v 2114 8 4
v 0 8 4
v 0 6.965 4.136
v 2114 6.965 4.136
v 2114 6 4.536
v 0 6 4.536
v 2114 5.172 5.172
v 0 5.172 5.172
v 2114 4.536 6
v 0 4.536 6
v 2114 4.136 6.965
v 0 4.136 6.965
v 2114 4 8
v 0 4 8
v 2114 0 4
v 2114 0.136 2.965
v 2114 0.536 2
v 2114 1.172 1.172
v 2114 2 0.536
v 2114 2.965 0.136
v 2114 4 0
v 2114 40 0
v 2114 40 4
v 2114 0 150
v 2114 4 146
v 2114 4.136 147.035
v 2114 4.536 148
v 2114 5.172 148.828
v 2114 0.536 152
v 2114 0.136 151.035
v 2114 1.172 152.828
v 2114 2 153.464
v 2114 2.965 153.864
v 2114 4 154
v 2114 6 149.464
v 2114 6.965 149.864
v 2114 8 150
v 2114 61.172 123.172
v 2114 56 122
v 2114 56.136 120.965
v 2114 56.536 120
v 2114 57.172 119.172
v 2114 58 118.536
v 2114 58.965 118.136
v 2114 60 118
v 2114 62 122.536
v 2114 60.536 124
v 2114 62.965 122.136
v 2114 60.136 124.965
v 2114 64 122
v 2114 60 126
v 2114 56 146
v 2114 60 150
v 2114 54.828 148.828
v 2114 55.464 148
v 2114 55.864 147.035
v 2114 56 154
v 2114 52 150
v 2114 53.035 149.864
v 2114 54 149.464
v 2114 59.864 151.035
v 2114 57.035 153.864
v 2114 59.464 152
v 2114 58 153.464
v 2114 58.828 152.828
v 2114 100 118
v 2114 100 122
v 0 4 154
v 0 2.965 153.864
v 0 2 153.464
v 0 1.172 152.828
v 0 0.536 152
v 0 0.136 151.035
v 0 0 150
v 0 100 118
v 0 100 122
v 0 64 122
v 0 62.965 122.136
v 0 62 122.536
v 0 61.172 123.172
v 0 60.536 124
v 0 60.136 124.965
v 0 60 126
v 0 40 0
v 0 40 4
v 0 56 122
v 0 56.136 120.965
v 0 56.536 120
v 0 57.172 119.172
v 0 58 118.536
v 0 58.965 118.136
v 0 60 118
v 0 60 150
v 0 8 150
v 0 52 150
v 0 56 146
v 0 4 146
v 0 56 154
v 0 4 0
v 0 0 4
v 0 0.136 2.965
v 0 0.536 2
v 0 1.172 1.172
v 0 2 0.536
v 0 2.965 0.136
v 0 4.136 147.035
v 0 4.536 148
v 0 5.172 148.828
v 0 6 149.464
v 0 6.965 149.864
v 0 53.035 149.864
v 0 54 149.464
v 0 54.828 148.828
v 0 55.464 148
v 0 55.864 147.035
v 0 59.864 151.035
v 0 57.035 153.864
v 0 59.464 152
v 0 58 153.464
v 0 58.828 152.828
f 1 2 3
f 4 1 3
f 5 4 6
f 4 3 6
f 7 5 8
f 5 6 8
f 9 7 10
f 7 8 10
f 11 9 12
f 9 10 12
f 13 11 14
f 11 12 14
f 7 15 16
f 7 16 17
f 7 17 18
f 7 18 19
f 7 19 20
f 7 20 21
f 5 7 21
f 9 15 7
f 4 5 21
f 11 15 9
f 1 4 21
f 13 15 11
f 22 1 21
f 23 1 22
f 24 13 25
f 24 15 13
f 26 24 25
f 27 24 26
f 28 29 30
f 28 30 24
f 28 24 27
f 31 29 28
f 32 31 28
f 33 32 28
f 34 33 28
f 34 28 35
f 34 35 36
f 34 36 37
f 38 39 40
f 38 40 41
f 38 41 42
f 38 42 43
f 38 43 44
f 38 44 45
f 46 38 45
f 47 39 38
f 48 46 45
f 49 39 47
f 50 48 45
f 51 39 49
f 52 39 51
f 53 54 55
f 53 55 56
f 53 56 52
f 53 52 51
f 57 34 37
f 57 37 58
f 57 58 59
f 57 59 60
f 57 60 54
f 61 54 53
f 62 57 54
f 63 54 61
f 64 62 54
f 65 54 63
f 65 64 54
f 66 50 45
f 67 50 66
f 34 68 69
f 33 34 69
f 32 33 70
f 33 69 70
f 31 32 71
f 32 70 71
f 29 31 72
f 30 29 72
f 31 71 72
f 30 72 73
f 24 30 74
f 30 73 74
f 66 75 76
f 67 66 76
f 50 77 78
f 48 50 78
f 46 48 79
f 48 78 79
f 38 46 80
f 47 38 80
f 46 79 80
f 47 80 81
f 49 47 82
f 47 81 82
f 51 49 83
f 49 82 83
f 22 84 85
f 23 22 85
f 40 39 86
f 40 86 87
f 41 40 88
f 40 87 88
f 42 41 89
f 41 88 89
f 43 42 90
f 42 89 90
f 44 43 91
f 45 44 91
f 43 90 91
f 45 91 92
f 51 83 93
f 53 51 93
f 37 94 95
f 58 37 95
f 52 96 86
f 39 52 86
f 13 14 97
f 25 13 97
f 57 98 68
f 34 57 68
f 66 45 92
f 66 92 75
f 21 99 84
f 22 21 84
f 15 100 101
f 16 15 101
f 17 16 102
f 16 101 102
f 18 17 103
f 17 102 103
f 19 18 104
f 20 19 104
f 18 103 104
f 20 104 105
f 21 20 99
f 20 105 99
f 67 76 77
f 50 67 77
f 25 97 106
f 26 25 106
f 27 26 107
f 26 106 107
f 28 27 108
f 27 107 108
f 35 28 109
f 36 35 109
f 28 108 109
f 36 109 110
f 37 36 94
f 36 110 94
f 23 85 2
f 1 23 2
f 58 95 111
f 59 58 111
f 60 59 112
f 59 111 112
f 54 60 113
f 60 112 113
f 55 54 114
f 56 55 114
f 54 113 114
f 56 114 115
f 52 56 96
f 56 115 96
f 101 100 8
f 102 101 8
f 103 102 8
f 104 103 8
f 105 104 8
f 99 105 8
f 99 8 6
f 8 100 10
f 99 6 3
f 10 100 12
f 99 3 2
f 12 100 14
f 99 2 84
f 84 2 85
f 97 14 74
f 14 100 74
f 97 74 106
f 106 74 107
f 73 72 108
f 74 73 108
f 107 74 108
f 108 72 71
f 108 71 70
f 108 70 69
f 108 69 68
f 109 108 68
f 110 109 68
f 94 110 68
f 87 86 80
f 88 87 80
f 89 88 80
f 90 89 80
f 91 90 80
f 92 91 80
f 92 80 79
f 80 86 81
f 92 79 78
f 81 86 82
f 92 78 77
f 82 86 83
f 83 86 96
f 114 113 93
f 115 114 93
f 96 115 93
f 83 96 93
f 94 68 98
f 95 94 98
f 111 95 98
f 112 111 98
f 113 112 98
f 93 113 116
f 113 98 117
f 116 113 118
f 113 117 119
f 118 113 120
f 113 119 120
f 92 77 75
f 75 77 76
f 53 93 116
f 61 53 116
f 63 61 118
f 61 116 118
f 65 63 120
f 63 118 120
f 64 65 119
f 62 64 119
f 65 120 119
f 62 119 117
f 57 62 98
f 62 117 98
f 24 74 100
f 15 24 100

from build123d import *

# Parameters (mm, degrees)
F1_DEPTH = 2114


with BuildPart() as f1:
    # F0 (on Right) → F1 (new body)
    with BuildSketch(Plane.YZ):
        with BuildLine():
            ThreePointArc((0, 4), (1.171573, 1.171573), (4, 0))
            Line((4, 0), (40, 0))
            Line((40, 0), (40, 4))
            Line((40, 4), (8, 4))
            ThreePointArc((8, 4), (5.171573, 5.171573), (4, 8))
            Line((4, 8), (4, 146))
            ThreePointArc((4, 146), (5.171573, 148.828427), (8, 150))
            Line((8, 150), (52, 150))
            ThreePointArc((52, 150), (54.828427, 148.828427), (56, 146))
            Line((56, 146), (56, 122))
            ThreePointArc((56, 122), (57.171573, 119.171573), (60, 118))
            Line((60, 118), (100, 118))
            Line((100, 118), (100, 122))
            Line((100, 122), (64, 122))
            ThreePointArc((64, 122), (61.171573, 123.171573), (60, 126))
            Line((60, 126), (60, 150))
            ThreePointArc((60, 150), (58.828427, 152.828427), (56, 154))
            Line((56, 154), (4, 154))
            ThreePointArc((4, 154), (1.171573, 152.828427), (0, 150))
            Line((0, 150), (0, 4))
        make_face()
    extrude(amount=F1_DEPTH)


solid = f1.part
